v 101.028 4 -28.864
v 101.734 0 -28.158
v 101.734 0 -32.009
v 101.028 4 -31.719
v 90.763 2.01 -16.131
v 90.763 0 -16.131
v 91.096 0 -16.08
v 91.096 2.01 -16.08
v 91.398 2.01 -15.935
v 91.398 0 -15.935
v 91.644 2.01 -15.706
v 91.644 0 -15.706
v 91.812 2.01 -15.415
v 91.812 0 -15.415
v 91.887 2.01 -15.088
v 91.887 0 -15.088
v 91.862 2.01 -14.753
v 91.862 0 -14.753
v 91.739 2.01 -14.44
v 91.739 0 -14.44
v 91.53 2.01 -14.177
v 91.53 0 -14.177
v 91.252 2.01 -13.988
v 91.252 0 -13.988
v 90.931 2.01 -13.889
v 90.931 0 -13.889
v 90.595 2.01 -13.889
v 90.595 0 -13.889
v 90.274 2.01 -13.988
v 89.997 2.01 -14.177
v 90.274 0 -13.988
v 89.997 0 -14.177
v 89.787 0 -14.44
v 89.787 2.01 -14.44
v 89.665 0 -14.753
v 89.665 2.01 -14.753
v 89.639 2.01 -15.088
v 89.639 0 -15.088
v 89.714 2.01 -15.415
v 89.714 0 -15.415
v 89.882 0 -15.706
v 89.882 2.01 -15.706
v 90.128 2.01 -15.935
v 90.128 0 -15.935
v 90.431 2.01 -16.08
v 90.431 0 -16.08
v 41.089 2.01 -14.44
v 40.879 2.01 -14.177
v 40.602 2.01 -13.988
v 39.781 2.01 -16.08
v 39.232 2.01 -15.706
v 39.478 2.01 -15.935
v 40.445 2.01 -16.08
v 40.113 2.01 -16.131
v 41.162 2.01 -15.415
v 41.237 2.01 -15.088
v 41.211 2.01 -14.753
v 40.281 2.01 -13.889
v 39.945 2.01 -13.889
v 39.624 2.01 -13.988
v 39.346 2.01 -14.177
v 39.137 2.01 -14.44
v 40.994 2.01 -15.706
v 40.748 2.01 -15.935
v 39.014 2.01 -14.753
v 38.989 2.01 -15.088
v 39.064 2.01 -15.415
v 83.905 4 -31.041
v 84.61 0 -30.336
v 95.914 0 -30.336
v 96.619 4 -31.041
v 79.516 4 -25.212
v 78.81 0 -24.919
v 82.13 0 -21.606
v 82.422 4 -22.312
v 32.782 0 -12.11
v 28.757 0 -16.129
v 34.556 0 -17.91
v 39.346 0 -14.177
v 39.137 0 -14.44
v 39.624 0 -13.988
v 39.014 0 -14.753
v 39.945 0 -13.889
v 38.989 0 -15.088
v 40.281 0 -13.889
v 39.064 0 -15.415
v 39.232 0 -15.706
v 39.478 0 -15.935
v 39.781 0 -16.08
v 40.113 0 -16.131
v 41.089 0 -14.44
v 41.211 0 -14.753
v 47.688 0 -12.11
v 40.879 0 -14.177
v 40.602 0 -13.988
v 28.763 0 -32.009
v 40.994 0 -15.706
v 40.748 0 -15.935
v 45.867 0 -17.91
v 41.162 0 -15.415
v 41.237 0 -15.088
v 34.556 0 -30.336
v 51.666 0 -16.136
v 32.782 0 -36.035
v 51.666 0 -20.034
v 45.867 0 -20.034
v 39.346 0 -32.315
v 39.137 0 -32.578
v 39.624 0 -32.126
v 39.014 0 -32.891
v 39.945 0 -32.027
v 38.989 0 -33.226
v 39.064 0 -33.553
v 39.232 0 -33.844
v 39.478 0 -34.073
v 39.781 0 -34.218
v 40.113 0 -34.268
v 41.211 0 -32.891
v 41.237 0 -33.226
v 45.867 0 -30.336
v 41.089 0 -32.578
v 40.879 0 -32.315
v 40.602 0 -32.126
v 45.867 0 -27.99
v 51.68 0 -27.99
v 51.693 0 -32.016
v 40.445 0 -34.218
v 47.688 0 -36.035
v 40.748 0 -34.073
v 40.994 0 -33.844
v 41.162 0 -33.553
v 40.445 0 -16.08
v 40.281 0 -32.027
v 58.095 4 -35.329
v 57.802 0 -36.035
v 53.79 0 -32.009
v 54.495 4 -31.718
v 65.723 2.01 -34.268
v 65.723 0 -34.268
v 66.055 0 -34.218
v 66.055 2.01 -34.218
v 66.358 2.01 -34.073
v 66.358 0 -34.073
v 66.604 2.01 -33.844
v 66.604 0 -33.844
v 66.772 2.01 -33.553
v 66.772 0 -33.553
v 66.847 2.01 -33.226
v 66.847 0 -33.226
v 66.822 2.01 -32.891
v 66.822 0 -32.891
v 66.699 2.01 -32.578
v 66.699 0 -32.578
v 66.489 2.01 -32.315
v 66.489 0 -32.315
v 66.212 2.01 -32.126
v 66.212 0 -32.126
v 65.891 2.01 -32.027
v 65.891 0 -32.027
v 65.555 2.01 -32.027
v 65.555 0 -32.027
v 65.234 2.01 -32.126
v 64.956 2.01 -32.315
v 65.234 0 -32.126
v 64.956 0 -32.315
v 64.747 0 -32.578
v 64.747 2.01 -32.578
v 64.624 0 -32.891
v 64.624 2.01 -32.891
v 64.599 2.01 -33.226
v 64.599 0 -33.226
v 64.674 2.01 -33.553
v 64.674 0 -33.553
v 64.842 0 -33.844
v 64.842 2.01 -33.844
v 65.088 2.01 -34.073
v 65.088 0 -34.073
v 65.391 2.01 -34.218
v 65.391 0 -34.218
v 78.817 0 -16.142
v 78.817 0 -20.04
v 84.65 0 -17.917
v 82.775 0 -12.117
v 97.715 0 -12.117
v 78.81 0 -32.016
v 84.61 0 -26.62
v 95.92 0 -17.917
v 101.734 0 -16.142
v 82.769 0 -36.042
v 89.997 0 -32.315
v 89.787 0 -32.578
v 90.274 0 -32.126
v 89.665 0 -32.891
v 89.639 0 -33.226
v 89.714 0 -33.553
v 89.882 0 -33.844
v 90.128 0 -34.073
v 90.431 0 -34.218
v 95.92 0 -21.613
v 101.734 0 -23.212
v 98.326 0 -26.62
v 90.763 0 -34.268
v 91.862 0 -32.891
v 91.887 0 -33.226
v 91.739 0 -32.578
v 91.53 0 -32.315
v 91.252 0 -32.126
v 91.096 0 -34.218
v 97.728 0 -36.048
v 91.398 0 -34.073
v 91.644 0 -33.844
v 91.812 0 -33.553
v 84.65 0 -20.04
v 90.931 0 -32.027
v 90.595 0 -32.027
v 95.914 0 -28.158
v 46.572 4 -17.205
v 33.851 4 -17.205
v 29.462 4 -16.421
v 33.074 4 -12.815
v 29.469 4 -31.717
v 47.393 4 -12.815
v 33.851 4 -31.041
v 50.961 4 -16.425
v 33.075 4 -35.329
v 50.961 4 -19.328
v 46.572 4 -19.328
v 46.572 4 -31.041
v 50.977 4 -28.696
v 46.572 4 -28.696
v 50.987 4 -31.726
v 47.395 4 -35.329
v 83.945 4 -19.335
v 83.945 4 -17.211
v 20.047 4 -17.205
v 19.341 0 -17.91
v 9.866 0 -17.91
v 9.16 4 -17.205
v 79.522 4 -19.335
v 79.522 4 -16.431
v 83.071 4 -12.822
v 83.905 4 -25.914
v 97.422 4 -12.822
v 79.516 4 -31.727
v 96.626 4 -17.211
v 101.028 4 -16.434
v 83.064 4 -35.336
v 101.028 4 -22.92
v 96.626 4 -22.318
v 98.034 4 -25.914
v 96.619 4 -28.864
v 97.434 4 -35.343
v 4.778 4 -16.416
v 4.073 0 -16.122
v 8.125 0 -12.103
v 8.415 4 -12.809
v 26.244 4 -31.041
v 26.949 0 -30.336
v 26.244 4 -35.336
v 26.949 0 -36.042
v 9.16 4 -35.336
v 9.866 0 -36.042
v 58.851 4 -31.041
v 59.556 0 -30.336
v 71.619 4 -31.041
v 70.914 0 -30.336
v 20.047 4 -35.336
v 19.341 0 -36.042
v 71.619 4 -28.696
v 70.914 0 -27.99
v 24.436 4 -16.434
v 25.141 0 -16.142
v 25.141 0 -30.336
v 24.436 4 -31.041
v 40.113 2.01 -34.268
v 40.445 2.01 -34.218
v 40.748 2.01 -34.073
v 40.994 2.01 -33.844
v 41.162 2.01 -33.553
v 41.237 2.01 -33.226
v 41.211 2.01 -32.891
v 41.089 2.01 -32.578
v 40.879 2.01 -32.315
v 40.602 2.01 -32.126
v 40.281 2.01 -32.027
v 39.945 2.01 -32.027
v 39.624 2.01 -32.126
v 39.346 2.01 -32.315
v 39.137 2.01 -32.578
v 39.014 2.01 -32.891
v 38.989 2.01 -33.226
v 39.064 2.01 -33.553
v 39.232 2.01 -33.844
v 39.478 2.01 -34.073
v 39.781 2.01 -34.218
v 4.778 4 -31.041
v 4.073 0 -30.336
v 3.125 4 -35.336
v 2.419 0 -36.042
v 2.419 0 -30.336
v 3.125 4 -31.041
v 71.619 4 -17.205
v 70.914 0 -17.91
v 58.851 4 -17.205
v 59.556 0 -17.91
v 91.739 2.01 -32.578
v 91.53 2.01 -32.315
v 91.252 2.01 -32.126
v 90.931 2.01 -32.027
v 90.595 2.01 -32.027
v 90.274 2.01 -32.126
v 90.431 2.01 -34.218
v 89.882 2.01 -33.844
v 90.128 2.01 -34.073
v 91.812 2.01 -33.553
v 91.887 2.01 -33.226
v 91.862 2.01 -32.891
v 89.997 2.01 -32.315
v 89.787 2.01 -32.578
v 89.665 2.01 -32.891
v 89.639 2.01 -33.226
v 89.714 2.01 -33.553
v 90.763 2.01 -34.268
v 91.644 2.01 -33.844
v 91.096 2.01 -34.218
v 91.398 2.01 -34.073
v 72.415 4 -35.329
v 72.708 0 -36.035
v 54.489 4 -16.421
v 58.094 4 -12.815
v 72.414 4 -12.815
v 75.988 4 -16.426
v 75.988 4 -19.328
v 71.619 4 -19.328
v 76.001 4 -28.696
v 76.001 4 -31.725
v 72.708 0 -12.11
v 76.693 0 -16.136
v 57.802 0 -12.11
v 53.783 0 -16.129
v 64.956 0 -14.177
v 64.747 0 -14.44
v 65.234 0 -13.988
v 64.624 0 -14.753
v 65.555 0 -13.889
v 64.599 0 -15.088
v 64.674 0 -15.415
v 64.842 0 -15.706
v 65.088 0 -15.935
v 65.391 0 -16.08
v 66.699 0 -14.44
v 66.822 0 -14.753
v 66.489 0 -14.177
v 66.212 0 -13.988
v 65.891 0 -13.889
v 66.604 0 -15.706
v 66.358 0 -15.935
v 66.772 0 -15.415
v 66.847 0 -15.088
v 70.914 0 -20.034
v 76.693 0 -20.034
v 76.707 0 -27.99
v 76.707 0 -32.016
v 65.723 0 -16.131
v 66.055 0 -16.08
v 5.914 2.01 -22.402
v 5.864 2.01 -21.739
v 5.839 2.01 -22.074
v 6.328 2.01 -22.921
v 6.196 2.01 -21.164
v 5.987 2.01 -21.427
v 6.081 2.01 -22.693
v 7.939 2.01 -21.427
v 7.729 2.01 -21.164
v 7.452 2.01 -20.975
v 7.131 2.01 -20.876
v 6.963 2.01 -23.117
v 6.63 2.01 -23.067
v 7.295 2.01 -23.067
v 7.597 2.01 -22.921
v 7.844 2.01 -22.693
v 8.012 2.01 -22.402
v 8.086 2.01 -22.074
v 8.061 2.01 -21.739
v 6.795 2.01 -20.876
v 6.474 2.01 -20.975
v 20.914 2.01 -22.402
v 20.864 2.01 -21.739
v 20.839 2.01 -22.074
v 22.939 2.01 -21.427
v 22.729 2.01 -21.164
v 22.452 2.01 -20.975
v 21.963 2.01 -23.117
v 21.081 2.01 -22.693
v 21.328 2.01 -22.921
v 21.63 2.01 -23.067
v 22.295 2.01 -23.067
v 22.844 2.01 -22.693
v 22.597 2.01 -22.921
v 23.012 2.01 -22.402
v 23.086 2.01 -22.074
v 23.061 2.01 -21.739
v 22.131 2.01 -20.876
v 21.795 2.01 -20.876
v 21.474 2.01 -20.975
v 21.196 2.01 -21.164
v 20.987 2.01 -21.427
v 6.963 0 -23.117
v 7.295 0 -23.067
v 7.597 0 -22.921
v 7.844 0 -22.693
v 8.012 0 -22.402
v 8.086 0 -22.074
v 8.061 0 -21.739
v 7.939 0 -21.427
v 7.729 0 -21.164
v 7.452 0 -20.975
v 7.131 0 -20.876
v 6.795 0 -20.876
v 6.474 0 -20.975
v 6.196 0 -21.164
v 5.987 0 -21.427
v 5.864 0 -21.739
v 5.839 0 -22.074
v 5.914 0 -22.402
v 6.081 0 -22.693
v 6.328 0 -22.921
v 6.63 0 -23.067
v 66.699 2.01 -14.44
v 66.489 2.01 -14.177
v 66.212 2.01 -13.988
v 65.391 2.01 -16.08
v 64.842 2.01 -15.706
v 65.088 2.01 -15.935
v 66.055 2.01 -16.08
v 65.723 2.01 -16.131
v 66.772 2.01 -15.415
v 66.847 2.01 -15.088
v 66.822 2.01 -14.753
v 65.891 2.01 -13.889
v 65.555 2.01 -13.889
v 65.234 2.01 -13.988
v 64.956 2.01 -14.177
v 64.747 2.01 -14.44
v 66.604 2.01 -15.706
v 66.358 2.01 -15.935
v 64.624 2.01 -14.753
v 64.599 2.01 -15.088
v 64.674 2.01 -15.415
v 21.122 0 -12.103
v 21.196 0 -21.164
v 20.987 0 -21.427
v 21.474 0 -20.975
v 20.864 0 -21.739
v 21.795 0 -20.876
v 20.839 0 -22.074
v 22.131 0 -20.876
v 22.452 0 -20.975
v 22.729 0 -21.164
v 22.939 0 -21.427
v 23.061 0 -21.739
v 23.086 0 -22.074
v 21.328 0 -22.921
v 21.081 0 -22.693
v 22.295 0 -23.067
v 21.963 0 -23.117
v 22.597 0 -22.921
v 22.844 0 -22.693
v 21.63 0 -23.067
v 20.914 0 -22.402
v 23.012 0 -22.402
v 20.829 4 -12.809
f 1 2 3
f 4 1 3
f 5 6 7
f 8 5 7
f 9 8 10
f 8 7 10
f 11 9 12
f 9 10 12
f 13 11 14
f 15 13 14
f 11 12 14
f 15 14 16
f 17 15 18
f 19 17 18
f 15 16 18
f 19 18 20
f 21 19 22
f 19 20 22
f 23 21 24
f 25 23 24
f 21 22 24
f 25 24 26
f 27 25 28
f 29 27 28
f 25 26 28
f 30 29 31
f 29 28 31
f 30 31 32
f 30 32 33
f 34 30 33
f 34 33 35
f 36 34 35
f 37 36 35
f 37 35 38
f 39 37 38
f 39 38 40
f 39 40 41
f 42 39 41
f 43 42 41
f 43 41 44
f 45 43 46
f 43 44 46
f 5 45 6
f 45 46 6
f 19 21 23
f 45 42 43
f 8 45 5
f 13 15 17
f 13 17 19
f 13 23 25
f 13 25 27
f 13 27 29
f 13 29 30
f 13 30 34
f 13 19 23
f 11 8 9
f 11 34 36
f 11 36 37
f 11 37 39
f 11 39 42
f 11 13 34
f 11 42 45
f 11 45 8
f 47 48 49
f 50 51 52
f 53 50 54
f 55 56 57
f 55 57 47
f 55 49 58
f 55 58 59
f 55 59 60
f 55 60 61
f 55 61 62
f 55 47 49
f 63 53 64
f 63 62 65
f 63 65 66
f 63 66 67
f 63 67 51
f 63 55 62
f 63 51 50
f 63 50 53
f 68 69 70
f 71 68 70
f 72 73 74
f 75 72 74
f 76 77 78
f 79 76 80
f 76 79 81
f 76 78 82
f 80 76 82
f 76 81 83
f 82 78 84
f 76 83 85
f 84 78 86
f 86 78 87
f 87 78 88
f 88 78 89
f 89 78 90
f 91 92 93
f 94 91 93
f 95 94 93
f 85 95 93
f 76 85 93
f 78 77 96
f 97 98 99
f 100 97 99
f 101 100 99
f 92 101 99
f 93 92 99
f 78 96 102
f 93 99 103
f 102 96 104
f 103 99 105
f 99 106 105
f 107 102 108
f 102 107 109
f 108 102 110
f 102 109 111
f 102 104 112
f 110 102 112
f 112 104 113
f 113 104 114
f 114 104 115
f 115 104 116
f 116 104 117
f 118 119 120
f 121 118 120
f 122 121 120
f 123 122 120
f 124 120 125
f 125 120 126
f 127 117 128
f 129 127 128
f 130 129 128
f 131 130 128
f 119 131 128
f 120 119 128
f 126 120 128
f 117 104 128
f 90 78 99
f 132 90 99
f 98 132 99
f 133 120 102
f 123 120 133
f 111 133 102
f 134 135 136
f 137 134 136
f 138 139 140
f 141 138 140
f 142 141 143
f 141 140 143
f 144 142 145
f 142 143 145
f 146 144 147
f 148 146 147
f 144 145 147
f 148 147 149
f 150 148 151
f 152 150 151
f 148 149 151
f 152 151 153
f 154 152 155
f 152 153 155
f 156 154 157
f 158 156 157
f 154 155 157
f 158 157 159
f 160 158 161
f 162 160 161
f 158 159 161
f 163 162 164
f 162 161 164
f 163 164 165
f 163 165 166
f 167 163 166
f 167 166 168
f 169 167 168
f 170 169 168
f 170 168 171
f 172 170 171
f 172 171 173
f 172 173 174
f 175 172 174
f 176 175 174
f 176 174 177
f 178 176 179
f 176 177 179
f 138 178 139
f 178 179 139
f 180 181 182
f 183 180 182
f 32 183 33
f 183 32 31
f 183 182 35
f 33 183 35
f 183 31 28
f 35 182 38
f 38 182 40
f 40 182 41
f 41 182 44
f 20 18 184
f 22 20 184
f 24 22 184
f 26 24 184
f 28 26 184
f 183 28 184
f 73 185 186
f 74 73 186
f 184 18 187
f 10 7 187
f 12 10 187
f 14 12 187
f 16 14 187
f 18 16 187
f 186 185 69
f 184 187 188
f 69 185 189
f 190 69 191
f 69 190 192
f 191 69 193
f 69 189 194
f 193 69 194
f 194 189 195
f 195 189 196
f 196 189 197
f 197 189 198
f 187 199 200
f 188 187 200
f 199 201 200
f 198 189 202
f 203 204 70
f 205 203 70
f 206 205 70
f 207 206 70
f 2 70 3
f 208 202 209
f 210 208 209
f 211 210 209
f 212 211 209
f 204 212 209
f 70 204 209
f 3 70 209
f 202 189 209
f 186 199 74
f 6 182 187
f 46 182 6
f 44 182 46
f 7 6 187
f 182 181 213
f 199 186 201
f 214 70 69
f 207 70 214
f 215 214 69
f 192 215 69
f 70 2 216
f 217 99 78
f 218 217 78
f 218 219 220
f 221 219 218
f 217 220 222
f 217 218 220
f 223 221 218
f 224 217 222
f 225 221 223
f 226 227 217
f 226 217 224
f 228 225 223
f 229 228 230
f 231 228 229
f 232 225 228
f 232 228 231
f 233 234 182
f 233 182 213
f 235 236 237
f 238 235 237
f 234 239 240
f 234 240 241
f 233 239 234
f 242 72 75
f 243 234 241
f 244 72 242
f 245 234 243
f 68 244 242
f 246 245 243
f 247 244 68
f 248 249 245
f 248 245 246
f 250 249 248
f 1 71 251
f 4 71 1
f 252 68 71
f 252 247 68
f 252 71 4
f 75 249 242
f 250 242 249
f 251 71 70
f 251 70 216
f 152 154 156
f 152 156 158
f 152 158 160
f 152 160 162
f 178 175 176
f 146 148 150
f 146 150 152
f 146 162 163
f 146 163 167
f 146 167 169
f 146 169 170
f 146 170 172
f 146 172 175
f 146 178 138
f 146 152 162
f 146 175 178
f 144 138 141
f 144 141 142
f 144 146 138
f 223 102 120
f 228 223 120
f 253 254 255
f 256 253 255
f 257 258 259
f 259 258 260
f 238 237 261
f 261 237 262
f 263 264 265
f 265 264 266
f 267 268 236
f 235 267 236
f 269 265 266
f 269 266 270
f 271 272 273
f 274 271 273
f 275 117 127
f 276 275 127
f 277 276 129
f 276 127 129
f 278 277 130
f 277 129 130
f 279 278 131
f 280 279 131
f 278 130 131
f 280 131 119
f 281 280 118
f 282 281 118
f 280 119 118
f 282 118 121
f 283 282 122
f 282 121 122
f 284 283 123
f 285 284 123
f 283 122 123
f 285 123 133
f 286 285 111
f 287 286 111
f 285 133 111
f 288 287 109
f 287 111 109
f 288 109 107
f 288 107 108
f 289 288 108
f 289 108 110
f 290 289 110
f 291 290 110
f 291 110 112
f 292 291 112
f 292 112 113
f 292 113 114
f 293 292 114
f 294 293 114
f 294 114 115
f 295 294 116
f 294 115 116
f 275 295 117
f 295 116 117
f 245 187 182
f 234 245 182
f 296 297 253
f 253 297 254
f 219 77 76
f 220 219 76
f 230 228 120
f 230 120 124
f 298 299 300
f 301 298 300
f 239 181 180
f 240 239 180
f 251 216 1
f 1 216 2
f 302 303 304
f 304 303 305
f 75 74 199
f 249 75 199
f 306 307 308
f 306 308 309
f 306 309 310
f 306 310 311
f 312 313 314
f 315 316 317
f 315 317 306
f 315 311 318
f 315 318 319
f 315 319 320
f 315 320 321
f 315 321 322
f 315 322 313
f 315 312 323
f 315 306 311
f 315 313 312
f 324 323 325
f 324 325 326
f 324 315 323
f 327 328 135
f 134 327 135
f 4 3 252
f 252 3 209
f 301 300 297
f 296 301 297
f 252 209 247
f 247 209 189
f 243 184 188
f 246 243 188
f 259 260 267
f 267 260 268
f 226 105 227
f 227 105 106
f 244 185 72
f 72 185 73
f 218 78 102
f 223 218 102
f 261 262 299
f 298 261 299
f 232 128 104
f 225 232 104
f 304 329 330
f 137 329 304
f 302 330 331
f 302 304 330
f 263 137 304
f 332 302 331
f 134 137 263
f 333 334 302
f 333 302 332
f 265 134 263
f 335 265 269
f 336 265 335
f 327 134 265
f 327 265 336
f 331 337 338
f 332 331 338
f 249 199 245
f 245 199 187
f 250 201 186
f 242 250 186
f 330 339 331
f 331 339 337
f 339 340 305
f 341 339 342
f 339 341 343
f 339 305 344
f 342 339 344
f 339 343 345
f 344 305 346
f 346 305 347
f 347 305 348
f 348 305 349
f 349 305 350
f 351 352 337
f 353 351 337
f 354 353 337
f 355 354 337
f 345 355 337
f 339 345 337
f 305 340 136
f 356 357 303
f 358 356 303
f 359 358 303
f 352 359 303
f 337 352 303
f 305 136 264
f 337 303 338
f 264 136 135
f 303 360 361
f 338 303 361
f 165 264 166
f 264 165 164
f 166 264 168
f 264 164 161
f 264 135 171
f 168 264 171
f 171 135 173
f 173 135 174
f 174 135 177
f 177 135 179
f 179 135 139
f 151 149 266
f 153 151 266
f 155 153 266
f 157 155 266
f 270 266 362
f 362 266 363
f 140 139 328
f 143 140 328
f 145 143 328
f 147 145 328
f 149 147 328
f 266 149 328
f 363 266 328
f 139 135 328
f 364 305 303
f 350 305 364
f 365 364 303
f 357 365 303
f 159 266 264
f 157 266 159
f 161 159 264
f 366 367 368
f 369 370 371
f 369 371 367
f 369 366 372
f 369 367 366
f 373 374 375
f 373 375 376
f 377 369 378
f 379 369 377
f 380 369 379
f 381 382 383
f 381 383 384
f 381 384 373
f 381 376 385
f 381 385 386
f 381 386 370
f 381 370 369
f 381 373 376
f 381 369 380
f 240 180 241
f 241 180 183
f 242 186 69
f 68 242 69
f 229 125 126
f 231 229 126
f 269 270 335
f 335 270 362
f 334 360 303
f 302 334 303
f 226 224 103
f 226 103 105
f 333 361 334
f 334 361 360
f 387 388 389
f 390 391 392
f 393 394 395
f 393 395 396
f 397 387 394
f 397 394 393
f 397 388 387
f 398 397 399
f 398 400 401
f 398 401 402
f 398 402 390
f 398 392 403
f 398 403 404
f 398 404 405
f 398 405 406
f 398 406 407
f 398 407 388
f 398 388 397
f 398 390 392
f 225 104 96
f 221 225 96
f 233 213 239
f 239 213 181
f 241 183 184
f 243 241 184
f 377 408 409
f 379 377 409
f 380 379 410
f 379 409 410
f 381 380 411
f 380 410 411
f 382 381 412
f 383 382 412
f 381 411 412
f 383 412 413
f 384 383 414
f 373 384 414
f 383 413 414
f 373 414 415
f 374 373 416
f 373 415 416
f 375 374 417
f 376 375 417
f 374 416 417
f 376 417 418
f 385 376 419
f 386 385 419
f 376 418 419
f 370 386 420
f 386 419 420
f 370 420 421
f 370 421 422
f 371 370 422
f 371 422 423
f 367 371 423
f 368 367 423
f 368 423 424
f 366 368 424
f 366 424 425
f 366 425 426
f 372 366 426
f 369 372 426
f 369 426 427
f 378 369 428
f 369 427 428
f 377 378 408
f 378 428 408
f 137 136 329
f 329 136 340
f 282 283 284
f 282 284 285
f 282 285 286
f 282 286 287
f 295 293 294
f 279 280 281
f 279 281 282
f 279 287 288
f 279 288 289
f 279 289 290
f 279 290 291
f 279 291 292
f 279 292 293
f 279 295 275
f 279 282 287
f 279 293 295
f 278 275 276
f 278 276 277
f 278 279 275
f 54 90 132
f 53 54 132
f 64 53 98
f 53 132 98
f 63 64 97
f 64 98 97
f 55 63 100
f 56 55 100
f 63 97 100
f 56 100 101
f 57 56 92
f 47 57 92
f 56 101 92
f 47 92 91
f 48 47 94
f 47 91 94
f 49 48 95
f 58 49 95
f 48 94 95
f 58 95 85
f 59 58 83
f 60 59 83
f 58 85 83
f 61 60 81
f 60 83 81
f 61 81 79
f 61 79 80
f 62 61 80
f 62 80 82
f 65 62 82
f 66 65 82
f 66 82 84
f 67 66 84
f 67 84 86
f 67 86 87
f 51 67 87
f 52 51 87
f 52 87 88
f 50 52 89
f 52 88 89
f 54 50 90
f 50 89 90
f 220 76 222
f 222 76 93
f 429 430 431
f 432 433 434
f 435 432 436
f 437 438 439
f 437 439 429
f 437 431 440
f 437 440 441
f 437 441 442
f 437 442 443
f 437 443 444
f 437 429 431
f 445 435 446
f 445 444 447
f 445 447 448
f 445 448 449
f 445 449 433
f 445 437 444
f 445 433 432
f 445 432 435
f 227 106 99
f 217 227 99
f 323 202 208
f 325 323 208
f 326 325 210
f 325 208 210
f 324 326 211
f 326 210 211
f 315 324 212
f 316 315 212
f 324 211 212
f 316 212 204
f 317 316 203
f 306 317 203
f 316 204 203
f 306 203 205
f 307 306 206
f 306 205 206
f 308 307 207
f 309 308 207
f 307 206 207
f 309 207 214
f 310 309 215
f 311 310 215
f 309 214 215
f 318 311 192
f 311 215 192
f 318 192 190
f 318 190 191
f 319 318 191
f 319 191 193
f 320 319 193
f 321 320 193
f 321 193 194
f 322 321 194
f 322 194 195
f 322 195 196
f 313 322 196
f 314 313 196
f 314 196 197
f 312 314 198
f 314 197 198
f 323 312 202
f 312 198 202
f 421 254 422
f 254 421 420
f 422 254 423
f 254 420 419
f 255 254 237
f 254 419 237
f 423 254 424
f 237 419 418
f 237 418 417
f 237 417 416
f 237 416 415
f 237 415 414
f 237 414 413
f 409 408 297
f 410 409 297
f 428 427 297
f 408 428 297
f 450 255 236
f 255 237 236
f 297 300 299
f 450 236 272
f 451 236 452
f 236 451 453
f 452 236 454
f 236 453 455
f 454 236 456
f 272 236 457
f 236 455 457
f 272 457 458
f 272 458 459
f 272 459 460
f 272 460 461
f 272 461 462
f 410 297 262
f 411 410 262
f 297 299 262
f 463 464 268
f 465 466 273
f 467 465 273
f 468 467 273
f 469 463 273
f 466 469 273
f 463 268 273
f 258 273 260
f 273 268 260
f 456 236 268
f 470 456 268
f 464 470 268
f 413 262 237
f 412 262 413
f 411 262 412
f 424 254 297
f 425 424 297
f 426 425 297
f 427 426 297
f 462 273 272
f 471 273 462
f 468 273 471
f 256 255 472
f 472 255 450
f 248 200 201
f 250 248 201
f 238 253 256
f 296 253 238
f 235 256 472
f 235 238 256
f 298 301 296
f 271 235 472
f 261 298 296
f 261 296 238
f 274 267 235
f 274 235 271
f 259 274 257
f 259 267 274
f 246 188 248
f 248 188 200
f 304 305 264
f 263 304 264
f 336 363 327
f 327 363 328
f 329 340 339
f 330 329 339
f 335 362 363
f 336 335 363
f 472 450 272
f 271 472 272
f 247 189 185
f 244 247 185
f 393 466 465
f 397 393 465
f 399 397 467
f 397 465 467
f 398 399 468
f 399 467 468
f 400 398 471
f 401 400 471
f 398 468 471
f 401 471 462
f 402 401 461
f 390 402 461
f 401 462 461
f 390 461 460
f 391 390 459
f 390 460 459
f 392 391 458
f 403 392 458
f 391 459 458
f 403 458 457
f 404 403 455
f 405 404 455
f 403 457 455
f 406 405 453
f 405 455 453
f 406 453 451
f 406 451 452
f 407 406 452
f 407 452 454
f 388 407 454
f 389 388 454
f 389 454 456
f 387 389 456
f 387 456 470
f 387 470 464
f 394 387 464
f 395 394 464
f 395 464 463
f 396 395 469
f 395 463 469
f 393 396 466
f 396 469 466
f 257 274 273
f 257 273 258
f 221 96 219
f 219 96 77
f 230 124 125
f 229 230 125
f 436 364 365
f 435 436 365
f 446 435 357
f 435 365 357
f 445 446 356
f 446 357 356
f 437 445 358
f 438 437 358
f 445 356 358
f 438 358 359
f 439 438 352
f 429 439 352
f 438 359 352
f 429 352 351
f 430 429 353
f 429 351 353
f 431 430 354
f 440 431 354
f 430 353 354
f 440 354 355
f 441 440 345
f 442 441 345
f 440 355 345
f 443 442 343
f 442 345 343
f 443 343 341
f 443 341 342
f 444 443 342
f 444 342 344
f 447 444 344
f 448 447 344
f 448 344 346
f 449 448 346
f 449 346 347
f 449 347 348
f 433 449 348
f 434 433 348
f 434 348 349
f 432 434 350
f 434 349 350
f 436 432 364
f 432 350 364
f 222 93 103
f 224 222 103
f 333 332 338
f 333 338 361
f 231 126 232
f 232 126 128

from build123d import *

# Parameters (mm, degrees)
BOSS_EXTRUDE1_DEPTH           = 4
BOSS_EXTRUDE1_DRAFT           = 10
BOSS_EXTRUDE1_PROFILE_2_DEPTH = 4
BOSS_EXTRUDE1_PROFILE_2_DRAFT = 10
BOSS_EXTRUDE1_PROFILE_3_DEPTH = 4
BOSS_EXTRUDE1_PROFILE_3_DRAFT = 10
BOSS_EXTRUDE1_PROFILE_4_DEPTH = 4
BOSS_EXTRUDE1_PROFILE_4_DRAFT = 10
SKETCH3_R                     = 1.127
CUT_EXTRUDE1_DEPTH            = 2.01


with BuildPart() as part:
    # Sketch2 → Boss-Extrude1 (with draft: the straight prism first)
    with BuildSketch(Plane(origin=(0, 0, 0), x_dir=(1, 0, 0), z_dir=(0, 1, 0))):
        Polygon((97.7281764, 36.0482388), (82.7685416, 36.0415332), (78.810231, 32.0159888), (78.810231, 24.9192542), (82.1301126, 21.6060782), (95.9203822, 21.6128092), (95.9203822, 17.9165758), (84.6502498, 17.9165758), (84.6502498, 20.040219), (78.8169366, 20.040219), (78.8169366, 16.1423858), (82.7752726, 12.1168668), (97.7147398, 12.1168668), (101.7335278, 16.1423858), (101.7335278, 23.2122726), (98.3262956, 26.6195048), (84.60994, 26.6195048), (84.60994, 30.3359058), (95.9136766, 30.3359058), (95.9136766, 28.1584908), (101.7335278, 28.1584908), (101.7335278, 32.0092832), align=None)
    extrude(amount=BOSS_EXTRUDE1_DEPTH)
    # Boss-Extrude1: the draft: its side faces are tilted about the plane it starts from
    boss_extrude1_sides = [part.faces().sort_by_distance(p)[0] for p in [
        (90.248359, 2, -36.044886),
        (80.7893863, 2, -34.028761),
        (78.810231, 2, -28.4676215),
        (80.4701718, 2, -23.2626662),
        (89.0252474, 2, -21.6094437),
        (95.9203822, 2, -19.7646925),
        (90.285316, 2, -17.9165758),
        (84.6502498, 2, -18.9783974),
        (81.7335932, 2, -20.040219),
        (78.8169366, 2, -18.0913024),
        (80.7961046, 2, -14.1296263),
        (90.2450062, 2, -12.1168668),
        (99.7241338, 2, -14.1296263),
        (101.7335278, 2, -19.6773292),
        (100.0299117, 2, -24.9158887),
        (91.4681178, 2, -26.6195048),
        (84.60994, 2, -28.4777053),
        (90.2618083, 2, -30.3359058),
        (95.9136766, 2, -29.2471983),
        (98.8236022, 2, -28.1584908),
        (101.7335278, 2, -30.083887),
        (99.7308521, 2, -34.028761),
    ]]
    draft(boss_extrude1_sides, Plane(origin=(0, 0, 0), x_dir=(1, 0, 0), z_dir=(0, 1, 0)), BOSS_EXTRUDE1_DRAFT)


with BuildPart() as body_2:
    # Sketch2 → Boss-Extrude1 profile 2 (with draft: the straight prism first)
    with BuildSketch(Plane(origin=(0, 0, 0), x_dir=(1, 0, 0), z_dir=(0, 1, 0))):
        Polygon((72.7080842, 36.0348022), (57.8022212, 36.0348022), (53.7901388, 32.0092832), (53.7834332, 16.1289492), (57.8022212, 12.1101358), (72.7080842, 12.1101358), (76.6932934, 16.1356802), (76.6932934, 20.0335134), (70.913752, 20.0335134), (70.913752, 17.9098702), (59.556269, 17.9098702), (59.556269, 30.3359058), (70.913752, 30.3359058), (70.913752, 27.9904698), (76.70673, 27.9904698), (76.70673, 32.0159888), align=None)
    extrude(amount=BOSS_EXTRUDE1_PROFILE_2_DEPTH)
    # Boss-Extrude1 profile 2: the draft: its side faces are tilted about the plane it starts from
    boss_extrude1_profile_2_sides = [body_2.faces().sort_by_distance(p)[0] for p in [
        (65.2551527, 2, -36.0348022),
        (55.79618, 2, -34.0220427),
        (53.786786, 2, -24.0691162),
        (55.7928272, 2, -14.1195425),
        (65.2551527, 2, -12.1101358),
        (74.7006888, 2, -14.122908),
        (76.6932934, 2, -18.0845968),
        (73.8035227, 2, -20.0335134),
        (70.913752, 2, -18.9716918),
        (65.2350105, 2, -17.9098702),
        (59.556269, 2, -24.122888),
        (65.2350105, 2, -30.3359058),
        (70.913752, 2, -29.1631878),
        (73.810241, 2, -27.9904698),
        (76.70673, 2, -30.0032293),
        (74.7074071, 2, -34.0253955),
    ]]
    draft(boss_extrude1_profile_2_sides, Plane(origin=(0, 0, 0), x_dir=(1, 0, 0), z_dir=(0, 1, 0)), BOSS_EXTRUDE1_PROFILE_2_DRAFT)


with BuildPart() as body_3:
    # Sketch2 → Boss-Extrude1 profile 3 (with draft: the straight prism first)
    with BuildSketch(Plane(origin=(0, 0, 0), x_dir=(1, 0, 0), z_dir=(0, 1, 0))):
        Polygon((47.6880174, 36.0348022), (32.7821544, 36.0348022), (28.763341, 32.0092832), (28.7566354, 16.1289492), (32.7821544, 12.1101358), (47.6880174, 12.1101358), (51.6664956, 16.1356802), (51.6664956, 20.0335134), (45.8667866, 20.0335134), (45.8667866, 17.9098702), (34.5563444, 17.9098702), (34.5563444, 30.3359058), (45.8667866, 30.3359058), (45.8667866, 27.9904698), (51.6799322, 27.9904698), (51.6933688, 32.0159888), align=None)
    extrude(amount=BOSS_EXTRUDE1_PROFILE_3_DEPTH)
    # Boss-Extrude1 profile 3: the draft: its side faces are tilted about the plane it starts from
    boss_extrude1_profile_3_sides = [body_3.faces().sort_by_distance(p)[0] for p in [
        (40.2350859, 2, -36.0348022),
        (30.7727477, 2, -34.0220427),
        (28.7599882, 2, -24.0691162),
        (30.7693949, 2, -14.1195425),
        (40.2350859, 2, -12.1101358),
        (49.6772565, 2, -14.122908),
        (51.6664956, 2, -18.0845968),
        (48.7666411, 2, -20.0335134),
        (45.8667866, 2, -18.9716918),
        (40.2115655, 2, -17.9098702),
        (34.5563444, 2, -24.122888),
        (40.2115655, 2, -30.3359058),
        (45.8667866, 2, -29.1631878),
        (48.7733594, 2, -27.9904698),
        (51.6866505, 2, -30.0032293),
        (49.6906931, 2, -34.0253955),
    ]]
    draft(boss_extrude1_profile_3_sides, Plane(origin=(0, 0, 0), x_dir=(1, 0, 0), z_dir=(0, 1, 0)), BOSS_EXTRUDE1_PROFILE_3_DRAFT)


with BuildPart() as body_4:
    # Sketch2 → Boss-Extrude1 profile 4 (with draft: the straight prism first)
    with BuildSketch(Plane(origin=(0, 0, 0), x_dir=(1, 0, 0), z_dir=(0, 1, 0))):
        Polygon((26.9488412, 36.0415332), (19.341338, 36.0415332), (19.341338, 17.9098702), (9.8655632, 17.9098702), (9.8655632, 36.0415332), (2.41935, 36.0415332), (2.41935, 30.3359058), (4.0725598, 30.3359058), (4.0725598, 16.1222182), (8.1249774, 12.1034302), (21.1222336, 12.1034302), (25.141047, 16.1423858), (25.141047, 30.3359058), (26.9488412, 30.3359058), align=None)
    extrude(amount=BOSS_EXTRUDE1_PROFILE_4_DEPTH)
    # Boss-Extrude1 profile 4: the draft: its side faces are tilted about the plane it starts from
    boss_extrude1_profile_4_sides = [body_4.faces().sort_by_distance(p)[0] for p in [
        (23.1450896, 2, -36.0415332),
        (19.341338, 2, -26.9757017),
        (14.6034506, 2, -17.9098702),
        (9.8655632, 2, -26.9757017),
        (6.1424566, 2, -36.0415332),
        (2.41935, 2, -33.1887195),
        (3.2459549, 2, -30.3359058),
        (4.0725598, 2, -23.229062),
        (6.0987686, 2, -14.1128242),
        (14.6236055, 2, -12.1034302),
        (23.1316403, 2, -14.122908),
        (25.141047, 2, -23.2391458),
        (26.0449441, 2, -30.3359058),
        (26.9488412, 2, -33.1887195),
    ]]
    draft(boss_extrude1_profile_4_sides, Plane(origin=(0, 0, 0), x_dir=(1, 0, 0), z_dir=(0, 1, 0)), BOSS_EXTRUDE1_PROFILE_4_DRAFT)


with BuildPart() as cut_extrude1_tool:
    # Sketch3 → Cut-Extrude1 (new body)
    with BuildSketch(Plane.XZ):
        with Locations(Location((90.763324993, -33.141385623, 0), (0, 0, 270))):
            Circle(SKETCH3_R)
        with Locations(Location((90.763324993, -15.003552377, 0), (0, 0, 270))):
            Circle(SKETCH3_R)
        with Locations(Location((65.722893132, -15.003552377, 0), (0, 0, 270))):
            Circle(SKETCH3_R)
        with Locations(Location((65.722893132, -33.141385623, 0), (0, 0, 270))):
            Circle(SKETCH3_R)
        with Locations(Location((40.112697061, -33.141385623, 0), (0, 0, 270))):
            Circle(SKETCH3_R)
        with Locations(Location((40.112697061, -15.003552377, 0), (0, 0, 270))):
            Circle(SKETCH3_R)
        with Locations(Location((21.962610877, -21.990115777, 0), (0, 0, 270))):
            Circle(SKETCH3_R)
        with Locations(Location((6.962610877, -21.990115777, 0), (0, 0, 270))):
            Circle(SKETCH3_R)
    extrude(amount=-CUT_EXTRUDE1_DEPTH)


with BuildPart() as part_1:
    add(part.part)

    # Cut-Extrude1: cut by cut_extrude1_tool
    add(cut_extrude1_tool.part, mode=Mode.SUBTRACT)


with BuildPart() as body_2_1:
    add(body_2.part)

    # Cut-Extrude1: cut by cut_extrude1_tool
    add(cut_extrude1_tool.part, mode=Mode.SUBTRACT)


with BuildPart() as body_3_1:
    add(body_3.part)

    # Cut-Extrude1: cut by cut_extrude1_tool
    add(cut_extrude1_tool.part, mode=Mode.SUBTRACT)


with BuildPart() as body_4_1:
    add(body_4.part)

    # Cut-Extrude1: cut by cut_extrude1_tool
    add(cut_extrude1_tool.part, mode=Mode.SUBTRACT)


solid = Compound([part_1.part, body_2_1.part, body_3_1.part, body_4_1.part])
